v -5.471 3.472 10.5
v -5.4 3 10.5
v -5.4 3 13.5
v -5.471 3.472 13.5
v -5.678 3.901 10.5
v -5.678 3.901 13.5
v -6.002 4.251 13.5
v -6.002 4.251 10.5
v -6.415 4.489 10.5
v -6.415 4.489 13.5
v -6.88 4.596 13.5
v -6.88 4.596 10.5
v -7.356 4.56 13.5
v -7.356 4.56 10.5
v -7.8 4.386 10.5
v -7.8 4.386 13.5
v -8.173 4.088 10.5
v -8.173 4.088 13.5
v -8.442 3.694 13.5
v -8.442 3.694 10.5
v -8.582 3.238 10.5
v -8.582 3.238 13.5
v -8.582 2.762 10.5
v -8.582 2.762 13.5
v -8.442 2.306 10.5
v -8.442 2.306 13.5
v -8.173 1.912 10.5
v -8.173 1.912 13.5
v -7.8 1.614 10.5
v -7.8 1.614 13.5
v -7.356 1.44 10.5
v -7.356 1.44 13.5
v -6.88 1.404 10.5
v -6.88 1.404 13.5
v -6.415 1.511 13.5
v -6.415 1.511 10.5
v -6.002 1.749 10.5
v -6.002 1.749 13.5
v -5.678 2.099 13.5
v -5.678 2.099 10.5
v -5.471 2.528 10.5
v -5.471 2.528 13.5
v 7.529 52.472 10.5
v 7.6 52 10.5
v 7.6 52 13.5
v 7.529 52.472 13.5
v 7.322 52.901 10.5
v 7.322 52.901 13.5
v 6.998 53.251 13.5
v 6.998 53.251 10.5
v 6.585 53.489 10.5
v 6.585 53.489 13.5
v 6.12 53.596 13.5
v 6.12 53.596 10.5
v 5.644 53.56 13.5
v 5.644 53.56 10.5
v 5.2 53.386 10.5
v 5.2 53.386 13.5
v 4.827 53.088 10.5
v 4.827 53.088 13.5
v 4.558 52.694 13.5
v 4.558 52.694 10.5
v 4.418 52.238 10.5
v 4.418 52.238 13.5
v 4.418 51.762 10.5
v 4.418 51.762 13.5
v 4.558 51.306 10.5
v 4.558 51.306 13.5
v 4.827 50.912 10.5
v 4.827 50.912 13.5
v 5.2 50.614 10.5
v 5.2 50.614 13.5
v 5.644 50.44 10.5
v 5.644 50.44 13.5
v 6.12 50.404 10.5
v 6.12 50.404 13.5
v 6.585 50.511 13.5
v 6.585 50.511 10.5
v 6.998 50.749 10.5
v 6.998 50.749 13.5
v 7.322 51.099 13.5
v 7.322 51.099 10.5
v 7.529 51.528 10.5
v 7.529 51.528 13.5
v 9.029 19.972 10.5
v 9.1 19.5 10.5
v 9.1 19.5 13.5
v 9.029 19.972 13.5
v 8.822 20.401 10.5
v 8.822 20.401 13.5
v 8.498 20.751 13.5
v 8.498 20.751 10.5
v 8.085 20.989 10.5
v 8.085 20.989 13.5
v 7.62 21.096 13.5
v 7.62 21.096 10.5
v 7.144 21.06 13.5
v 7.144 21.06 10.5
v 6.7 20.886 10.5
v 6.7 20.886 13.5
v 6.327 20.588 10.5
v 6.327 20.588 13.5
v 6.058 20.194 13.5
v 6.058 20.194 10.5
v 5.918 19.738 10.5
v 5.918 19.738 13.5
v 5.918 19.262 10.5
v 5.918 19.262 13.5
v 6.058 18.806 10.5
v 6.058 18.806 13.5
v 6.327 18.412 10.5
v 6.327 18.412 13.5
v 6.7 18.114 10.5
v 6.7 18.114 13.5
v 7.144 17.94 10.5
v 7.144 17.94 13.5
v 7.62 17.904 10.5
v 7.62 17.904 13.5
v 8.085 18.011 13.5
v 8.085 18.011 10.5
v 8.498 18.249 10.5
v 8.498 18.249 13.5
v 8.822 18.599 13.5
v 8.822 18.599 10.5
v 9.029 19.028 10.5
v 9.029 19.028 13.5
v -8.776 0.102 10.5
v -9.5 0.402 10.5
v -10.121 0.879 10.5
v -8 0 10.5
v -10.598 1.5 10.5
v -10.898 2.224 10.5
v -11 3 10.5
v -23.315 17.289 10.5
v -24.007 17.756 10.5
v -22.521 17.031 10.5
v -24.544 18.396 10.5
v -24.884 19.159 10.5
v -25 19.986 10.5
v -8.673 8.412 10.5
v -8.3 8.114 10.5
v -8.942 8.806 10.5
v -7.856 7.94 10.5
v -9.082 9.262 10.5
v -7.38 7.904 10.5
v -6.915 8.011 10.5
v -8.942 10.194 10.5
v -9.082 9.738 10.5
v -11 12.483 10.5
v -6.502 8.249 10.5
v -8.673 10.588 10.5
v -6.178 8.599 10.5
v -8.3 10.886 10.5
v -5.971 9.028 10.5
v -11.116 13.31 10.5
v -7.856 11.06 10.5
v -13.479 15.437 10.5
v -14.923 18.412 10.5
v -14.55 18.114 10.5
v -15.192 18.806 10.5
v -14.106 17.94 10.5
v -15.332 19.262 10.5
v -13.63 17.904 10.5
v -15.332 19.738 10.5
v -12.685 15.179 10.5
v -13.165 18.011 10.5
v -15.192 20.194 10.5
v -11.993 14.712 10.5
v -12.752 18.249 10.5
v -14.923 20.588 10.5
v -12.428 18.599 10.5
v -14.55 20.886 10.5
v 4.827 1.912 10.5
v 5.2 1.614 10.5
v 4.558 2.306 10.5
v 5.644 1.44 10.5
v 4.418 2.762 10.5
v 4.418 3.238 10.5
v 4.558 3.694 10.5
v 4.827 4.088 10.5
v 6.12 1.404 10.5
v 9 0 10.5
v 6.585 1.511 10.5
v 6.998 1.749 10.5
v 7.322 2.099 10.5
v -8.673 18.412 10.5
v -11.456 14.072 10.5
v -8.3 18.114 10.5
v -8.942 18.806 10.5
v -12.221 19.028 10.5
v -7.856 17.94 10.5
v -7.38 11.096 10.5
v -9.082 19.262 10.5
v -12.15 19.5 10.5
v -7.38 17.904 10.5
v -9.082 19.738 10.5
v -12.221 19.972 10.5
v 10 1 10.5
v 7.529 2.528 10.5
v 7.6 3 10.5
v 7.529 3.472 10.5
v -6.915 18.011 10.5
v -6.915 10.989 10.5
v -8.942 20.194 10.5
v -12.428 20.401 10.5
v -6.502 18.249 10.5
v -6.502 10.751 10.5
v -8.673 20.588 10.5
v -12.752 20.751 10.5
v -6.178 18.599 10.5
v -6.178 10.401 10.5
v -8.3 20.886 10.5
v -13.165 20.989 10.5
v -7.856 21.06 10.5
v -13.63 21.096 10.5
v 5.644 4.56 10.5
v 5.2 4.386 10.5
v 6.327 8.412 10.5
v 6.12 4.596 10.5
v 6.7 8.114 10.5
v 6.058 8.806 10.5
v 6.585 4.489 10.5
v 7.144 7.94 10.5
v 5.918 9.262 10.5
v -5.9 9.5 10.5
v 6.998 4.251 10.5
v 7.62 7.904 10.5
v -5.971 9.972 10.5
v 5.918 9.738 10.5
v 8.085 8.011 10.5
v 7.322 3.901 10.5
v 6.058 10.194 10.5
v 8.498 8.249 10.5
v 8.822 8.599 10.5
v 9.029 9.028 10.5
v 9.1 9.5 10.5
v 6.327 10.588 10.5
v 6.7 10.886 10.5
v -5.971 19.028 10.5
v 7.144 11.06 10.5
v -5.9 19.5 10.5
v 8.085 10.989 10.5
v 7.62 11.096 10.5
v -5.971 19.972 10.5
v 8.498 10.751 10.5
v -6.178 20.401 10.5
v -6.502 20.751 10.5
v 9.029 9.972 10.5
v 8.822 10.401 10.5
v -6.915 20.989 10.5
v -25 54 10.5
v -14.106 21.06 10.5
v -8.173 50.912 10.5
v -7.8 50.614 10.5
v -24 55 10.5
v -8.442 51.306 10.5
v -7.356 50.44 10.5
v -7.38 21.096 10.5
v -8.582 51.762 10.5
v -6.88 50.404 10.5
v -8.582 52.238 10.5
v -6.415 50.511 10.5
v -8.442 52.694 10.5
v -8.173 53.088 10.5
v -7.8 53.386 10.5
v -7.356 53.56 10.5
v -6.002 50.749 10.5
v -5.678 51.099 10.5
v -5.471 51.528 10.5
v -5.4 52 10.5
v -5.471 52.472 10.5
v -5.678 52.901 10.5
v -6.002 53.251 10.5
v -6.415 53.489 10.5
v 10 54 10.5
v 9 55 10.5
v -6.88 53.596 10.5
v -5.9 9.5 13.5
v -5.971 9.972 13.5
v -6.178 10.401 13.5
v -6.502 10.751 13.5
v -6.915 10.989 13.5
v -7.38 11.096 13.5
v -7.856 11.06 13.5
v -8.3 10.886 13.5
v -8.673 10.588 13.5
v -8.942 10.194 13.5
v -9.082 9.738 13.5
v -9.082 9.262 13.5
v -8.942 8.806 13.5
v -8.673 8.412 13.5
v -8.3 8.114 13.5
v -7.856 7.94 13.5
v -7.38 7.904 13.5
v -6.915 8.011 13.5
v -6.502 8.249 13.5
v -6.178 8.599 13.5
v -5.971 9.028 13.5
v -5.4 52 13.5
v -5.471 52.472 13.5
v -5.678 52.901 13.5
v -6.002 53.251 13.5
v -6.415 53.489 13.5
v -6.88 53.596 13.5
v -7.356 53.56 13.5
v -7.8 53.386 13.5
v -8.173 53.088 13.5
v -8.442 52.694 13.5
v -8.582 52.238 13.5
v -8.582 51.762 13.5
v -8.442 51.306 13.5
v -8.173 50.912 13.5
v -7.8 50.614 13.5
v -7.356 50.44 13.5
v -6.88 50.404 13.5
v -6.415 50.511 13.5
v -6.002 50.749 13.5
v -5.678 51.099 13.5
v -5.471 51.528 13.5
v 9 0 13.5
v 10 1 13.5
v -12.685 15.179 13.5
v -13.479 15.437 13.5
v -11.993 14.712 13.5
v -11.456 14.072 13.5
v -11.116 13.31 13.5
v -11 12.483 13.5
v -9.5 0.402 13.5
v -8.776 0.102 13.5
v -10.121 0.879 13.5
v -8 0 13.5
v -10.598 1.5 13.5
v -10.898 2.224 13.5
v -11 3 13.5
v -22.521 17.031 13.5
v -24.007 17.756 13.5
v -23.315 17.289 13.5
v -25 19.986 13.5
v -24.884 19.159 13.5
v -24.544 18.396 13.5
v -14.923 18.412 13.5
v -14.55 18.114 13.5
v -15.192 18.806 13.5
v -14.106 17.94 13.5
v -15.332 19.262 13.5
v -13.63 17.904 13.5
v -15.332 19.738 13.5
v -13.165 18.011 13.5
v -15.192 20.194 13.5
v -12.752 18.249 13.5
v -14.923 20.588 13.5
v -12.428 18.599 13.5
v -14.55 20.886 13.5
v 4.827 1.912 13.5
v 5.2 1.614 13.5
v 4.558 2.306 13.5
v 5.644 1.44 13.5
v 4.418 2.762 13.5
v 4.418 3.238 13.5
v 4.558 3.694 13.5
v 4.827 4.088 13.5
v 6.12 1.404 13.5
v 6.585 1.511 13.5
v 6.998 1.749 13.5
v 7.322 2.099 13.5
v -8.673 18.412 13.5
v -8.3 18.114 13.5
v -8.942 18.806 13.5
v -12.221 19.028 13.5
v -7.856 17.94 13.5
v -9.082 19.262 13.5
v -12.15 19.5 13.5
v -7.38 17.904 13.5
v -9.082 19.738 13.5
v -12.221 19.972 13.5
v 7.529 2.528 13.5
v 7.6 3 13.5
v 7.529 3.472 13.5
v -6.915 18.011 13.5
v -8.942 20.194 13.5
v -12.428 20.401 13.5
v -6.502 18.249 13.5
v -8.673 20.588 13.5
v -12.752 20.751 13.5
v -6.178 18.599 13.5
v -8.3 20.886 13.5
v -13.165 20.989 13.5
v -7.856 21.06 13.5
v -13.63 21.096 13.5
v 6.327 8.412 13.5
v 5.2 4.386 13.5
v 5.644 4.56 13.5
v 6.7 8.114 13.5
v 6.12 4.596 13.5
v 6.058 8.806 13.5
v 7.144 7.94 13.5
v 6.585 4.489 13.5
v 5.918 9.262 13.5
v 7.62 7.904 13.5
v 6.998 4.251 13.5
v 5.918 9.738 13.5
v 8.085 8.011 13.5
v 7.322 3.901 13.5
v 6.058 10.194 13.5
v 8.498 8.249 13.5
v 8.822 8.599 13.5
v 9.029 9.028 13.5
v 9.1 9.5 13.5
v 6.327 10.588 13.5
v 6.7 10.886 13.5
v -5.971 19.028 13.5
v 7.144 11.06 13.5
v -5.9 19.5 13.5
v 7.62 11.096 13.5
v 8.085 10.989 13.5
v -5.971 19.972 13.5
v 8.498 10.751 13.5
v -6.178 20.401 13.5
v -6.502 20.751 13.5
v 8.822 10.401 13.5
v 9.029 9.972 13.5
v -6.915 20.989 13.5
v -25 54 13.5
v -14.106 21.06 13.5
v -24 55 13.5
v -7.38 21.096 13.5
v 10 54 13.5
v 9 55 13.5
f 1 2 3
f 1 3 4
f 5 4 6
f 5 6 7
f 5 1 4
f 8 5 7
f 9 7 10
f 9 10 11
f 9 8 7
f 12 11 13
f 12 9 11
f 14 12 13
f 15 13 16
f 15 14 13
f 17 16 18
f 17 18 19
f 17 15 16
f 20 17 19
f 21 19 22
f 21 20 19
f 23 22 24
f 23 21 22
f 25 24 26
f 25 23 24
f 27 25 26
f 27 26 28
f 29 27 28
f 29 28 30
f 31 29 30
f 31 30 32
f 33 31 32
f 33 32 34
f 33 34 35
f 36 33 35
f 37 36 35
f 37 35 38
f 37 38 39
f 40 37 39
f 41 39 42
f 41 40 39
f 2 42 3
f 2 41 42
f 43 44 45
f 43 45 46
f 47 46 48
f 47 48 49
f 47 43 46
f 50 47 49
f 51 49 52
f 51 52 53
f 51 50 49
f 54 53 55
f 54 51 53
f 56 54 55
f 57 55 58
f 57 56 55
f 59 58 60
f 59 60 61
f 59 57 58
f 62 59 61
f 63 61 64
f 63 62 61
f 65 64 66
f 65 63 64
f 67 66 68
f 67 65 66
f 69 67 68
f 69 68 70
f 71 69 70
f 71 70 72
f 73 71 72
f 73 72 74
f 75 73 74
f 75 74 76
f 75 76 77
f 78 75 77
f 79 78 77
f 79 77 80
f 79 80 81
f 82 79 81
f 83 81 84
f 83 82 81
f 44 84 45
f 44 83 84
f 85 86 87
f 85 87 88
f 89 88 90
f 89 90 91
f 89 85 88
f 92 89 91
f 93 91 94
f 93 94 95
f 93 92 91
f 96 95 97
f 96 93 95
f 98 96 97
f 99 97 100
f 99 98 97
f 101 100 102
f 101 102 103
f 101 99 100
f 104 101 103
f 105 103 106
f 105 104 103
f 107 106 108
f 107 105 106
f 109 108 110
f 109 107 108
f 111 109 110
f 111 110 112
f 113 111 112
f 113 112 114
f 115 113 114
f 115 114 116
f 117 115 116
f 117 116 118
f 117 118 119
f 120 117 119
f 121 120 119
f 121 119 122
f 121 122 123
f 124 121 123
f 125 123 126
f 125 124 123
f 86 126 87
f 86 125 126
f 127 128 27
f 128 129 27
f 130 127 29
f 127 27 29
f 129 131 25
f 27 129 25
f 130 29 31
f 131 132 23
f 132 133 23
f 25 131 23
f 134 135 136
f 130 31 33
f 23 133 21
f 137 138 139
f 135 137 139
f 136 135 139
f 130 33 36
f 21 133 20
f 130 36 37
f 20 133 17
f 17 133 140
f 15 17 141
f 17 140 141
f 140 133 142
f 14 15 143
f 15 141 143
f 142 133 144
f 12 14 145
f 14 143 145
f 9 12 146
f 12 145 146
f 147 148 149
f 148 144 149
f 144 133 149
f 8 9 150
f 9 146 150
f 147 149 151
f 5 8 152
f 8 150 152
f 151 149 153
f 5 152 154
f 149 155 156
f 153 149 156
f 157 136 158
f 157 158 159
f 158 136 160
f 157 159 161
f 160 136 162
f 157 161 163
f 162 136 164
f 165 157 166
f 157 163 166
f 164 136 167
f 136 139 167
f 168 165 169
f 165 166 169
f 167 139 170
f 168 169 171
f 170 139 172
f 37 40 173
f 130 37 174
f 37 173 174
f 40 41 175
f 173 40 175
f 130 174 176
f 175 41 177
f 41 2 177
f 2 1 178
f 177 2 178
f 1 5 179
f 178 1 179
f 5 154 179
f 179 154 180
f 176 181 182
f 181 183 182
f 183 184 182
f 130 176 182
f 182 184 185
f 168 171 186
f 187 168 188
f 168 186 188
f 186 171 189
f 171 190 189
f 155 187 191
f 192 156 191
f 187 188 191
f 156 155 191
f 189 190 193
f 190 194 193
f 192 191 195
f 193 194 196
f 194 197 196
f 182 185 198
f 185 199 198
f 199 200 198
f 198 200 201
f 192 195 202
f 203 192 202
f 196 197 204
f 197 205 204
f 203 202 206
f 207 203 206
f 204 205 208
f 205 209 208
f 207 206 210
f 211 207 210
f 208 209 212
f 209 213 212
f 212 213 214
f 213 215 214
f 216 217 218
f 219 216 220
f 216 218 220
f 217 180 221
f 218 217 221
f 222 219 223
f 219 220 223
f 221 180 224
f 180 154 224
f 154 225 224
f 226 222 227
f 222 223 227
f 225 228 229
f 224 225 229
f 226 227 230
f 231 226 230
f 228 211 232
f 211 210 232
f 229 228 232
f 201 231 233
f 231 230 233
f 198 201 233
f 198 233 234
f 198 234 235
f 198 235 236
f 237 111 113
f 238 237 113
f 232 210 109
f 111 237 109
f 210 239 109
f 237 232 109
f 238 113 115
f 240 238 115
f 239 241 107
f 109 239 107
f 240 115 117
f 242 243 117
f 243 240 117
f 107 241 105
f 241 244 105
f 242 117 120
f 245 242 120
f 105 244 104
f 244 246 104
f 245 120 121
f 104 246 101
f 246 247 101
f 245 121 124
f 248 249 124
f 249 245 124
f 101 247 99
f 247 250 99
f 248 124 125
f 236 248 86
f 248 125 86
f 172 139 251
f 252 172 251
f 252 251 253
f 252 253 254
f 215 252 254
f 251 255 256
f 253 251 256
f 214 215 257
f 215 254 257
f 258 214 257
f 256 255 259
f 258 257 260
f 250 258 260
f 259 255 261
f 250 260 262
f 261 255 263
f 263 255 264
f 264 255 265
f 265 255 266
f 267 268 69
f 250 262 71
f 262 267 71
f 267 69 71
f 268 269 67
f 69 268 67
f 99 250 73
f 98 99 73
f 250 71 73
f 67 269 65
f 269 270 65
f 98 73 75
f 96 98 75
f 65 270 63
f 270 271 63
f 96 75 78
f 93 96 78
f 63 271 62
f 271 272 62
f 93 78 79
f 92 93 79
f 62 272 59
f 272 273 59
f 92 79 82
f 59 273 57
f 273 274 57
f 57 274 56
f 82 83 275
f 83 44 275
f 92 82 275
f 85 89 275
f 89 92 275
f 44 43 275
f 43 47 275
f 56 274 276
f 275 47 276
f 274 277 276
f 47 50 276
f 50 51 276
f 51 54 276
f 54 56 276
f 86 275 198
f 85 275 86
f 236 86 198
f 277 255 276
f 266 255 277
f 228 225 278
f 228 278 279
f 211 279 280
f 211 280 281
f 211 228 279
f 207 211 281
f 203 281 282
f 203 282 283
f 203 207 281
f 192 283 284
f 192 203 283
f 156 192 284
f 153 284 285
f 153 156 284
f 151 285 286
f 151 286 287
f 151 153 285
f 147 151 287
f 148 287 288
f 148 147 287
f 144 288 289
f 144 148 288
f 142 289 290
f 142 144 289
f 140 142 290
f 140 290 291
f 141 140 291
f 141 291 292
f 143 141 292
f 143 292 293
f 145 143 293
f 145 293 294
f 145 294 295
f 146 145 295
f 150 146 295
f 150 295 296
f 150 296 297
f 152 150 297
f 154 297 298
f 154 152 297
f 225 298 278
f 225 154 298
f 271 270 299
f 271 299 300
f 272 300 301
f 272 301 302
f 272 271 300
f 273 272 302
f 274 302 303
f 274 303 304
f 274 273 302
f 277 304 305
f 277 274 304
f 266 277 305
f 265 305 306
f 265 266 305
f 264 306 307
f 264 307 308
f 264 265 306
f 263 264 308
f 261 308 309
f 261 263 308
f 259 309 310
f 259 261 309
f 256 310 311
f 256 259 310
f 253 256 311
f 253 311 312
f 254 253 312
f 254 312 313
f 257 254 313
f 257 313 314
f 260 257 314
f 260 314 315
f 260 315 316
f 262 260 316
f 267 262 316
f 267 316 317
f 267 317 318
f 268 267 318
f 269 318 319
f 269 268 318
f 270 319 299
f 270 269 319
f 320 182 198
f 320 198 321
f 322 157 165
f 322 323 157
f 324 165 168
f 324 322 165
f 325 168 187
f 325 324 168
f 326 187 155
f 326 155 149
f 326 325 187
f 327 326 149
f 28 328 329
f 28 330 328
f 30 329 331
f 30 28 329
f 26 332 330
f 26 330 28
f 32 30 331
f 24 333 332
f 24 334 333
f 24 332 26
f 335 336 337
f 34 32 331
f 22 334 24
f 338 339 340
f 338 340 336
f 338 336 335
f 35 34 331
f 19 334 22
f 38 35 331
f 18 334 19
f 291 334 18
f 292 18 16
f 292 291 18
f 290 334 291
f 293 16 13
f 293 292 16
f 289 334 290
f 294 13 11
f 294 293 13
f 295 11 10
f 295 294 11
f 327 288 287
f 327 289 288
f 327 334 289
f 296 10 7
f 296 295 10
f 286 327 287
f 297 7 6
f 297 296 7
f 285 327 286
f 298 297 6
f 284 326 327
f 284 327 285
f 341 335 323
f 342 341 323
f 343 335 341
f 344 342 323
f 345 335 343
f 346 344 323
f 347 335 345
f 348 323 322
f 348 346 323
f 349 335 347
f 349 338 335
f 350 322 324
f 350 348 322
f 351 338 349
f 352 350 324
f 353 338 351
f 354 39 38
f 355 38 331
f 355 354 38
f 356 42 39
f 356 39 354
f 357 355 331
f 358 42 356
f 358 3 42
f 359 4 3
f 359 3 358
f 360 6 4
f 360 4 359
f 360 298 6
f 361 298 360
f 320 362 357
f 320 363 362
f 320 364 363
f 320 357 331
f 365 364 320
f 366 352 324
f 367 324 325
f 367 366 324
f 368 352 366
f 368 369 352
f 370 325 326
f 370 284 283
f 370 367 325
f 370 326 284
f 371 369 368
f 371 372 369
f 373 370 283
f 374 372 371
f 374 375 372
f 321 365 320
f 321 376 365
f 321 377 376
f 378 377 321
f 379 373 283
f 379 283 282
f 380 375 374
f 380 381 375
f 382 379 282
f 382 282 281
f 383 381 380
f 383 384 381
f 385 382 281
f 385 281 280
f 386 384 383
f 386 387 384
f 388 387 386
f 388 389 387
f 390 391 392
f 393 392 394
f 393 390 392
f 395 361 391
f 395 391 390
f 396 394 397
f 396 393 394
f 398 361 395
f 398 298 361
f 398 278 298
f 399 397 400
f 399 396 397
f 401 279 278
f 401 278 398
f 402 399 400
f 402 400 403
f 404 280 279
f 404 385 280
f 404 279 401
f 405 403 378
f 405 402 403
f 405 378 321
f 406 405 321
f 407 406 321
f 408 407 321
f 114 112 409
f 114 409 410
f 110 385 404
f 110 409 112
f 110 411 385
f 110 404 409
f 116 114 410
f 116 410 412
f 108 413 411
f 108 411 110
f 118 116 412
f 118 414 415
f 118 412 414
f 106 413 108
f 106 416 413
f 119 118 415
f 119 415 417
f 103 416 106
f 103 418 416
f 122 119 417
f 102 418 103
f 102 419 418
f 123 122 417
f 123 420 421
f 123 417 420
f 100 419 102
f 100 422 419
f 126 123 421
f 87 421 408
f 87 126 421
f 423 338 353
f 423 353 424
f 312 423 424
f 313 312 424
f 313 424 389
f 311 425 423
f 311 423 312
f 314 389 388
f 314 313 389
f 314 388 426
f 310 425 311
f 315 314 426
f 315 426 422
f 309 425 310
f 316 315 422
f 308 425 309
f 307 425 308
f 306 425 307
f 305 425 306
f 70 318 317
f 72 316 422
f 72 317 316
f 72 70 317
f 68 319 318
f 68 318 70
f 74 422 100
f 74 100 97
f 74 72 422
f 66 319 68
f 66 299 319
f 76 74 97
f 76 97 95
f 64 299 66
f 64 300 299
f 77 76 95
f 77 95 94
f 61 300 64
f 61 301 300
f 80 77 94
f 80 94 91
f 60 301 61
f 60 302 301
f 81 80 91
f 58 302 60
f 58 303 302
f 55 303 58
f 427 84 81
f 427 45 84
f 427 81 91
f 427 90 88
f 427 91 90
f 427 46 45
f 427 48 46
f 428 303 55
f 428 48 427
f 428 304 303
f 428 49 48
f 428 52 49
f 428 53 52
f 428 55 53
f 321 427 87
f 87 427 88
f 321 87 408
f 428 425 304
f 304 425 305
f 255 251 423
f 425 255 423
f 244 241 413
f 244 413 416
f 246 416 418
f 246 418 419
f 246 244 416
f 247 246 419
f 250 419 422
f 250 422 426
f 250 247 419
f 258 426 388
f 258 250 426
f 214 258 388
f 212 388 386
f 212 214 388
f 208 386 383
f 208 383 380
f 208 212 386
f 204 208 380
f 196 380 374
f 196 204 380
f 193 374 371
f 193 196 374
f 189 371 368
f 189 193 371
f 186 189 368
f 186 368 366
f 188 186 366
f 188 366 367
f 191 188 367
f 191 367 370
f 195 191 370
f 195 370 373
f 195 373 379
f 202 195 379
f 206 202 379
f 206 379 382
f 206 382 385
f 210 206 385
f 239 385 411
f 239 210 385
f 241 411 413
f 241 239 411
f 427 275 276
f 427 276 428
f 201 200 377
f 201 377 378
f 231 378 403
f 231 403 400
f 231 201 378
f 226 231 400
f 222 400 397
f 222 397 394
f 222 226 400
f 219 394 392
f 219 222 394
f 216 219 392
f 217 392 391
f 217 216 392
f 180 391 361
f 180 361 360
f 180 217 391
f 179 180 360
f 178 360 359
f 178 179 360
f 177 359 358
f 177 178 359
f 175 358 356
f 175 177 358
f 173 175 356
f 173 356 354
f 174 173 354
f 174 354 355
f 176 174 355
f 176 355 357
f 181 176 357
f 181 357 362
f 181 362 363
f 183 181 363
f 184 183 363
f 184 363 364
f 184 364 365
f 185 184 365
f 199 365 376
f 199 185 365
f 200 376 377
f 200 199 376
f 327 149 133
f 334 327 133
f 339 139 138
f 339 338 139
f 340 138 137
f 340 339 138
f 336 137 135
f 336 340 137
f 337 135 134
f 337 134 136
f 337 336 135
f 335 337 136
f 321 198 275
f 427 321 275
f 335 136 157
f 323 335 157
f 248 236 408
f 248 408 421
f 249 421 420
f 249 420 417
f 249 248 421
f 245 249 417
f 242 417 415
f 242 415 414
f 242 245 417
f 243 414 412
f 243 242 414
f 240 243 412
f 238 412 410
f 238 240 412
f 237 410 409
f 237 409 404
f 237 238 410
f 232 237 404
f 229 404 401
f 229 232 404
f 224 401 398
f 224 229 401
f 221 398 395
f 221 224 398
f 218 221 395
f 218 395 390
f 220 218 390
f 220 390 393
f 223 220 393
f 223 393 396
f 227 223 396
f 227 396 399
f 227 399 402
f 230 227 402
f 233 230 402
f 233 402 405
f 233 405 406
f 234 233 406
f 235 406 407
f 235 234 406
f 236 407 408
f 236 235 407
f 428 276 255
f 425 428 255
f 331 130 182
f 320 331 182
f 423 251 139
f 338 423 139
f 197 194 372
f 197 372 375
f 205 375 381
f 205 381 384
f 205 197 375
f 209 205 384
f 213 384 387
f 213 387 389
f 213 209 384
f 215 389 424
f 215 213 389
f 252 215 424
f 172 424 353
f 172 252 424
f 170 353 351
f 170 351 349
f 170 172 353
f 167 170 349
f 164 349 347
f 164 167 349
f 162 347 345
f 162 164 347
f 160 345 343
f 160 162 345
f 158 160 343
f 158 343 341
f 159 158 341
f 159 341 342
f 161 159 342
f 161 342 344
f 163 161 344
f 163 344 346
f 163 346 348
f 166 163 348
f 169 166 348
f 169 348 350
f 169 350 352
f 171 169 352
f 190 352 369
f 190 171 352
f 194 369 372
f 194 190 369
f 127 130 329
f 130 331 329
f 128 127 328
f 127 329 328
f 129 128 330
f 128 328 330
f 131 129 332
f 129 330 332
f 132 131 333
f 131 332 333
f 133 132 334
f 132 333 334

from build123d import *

# Parameters (mm, degrees)
SKETCH081_R     = 1.6
PAD046_DEPTH    = 3
CHAMFER026_SIZE = 1
FILLET021_R     = 3


with BuildPart() as part:
    # Sketch081 → Pad046 (new body)
    with BuildSketch(Plane.XY):
        Polygon((10, 55), (-25, 55), (-25, 17.468578), (-11, 15), (-11, 0), (10, 0), align=None)
        with Locations((-7.5, 19.5)):
            Circle(SKETCH081_R, mode=Mode.SUBTRACT)
        with Locations((7.5, 19.5)):
            Circle(SKETCH081_R, mode=Mode.SUBTRACT)
        with Locations((7.5, 9.5)):
            Circle(SKETCH081_R, mode=Mode.SUBTRACT)
        with Locations((-7.5, 9.5)):
            Circle(SKETCH081_R, mode=Mode.SUBTRACT)
        with Locations((-7, 52)):
            Circle(SKETCH081_R, mode=Mode.SUBTRACT)
        with Locations((6, 52)):
            Circle(SKETCH081_R, mode=Mode.SUBTRACT)
        with Locations((-7, 3)):
            Circle(SKETCH081_R, mode=Mode.SUBTRACT)
        with Locations((6, 3)):
            Circle(SKETCH081_R, mode=Mode.SUBTRACT)
        with Locations((-13.75, 19.5)):
            Circle(SKETCH081_R, mode=Mode.SUBTRACT)
    extrude(amount=PAD046_DEPTH)

    # Chamfer026
    chamfer026_edges = [part.edges().sort_by_distance(p)[0] for p in [
        (10, 0, 1.5),
        (10, 55, 1.5),
        (-25, 55, 1.5),
    ]]
    chamfer(chamfer026_edges, length=CHAMFER026_SIZE)

    # Fillet021
    fillet021_edges = [part.edges().sort_by_distance(p)[0] for p in [
        (-25, 17.468578, 1.5),
        (-11, 15, 1.5),
        (-11, 0, 1.5),
    ]]
    fillet(fillet021_edges, radius=FILLET021_R)


with BuildPart() as part_1:
    # Body038 placement: moved
    add(part.part.moved(Location((-2e-06, -1.5e-05, 10.499998))))


solid = part_1.part
